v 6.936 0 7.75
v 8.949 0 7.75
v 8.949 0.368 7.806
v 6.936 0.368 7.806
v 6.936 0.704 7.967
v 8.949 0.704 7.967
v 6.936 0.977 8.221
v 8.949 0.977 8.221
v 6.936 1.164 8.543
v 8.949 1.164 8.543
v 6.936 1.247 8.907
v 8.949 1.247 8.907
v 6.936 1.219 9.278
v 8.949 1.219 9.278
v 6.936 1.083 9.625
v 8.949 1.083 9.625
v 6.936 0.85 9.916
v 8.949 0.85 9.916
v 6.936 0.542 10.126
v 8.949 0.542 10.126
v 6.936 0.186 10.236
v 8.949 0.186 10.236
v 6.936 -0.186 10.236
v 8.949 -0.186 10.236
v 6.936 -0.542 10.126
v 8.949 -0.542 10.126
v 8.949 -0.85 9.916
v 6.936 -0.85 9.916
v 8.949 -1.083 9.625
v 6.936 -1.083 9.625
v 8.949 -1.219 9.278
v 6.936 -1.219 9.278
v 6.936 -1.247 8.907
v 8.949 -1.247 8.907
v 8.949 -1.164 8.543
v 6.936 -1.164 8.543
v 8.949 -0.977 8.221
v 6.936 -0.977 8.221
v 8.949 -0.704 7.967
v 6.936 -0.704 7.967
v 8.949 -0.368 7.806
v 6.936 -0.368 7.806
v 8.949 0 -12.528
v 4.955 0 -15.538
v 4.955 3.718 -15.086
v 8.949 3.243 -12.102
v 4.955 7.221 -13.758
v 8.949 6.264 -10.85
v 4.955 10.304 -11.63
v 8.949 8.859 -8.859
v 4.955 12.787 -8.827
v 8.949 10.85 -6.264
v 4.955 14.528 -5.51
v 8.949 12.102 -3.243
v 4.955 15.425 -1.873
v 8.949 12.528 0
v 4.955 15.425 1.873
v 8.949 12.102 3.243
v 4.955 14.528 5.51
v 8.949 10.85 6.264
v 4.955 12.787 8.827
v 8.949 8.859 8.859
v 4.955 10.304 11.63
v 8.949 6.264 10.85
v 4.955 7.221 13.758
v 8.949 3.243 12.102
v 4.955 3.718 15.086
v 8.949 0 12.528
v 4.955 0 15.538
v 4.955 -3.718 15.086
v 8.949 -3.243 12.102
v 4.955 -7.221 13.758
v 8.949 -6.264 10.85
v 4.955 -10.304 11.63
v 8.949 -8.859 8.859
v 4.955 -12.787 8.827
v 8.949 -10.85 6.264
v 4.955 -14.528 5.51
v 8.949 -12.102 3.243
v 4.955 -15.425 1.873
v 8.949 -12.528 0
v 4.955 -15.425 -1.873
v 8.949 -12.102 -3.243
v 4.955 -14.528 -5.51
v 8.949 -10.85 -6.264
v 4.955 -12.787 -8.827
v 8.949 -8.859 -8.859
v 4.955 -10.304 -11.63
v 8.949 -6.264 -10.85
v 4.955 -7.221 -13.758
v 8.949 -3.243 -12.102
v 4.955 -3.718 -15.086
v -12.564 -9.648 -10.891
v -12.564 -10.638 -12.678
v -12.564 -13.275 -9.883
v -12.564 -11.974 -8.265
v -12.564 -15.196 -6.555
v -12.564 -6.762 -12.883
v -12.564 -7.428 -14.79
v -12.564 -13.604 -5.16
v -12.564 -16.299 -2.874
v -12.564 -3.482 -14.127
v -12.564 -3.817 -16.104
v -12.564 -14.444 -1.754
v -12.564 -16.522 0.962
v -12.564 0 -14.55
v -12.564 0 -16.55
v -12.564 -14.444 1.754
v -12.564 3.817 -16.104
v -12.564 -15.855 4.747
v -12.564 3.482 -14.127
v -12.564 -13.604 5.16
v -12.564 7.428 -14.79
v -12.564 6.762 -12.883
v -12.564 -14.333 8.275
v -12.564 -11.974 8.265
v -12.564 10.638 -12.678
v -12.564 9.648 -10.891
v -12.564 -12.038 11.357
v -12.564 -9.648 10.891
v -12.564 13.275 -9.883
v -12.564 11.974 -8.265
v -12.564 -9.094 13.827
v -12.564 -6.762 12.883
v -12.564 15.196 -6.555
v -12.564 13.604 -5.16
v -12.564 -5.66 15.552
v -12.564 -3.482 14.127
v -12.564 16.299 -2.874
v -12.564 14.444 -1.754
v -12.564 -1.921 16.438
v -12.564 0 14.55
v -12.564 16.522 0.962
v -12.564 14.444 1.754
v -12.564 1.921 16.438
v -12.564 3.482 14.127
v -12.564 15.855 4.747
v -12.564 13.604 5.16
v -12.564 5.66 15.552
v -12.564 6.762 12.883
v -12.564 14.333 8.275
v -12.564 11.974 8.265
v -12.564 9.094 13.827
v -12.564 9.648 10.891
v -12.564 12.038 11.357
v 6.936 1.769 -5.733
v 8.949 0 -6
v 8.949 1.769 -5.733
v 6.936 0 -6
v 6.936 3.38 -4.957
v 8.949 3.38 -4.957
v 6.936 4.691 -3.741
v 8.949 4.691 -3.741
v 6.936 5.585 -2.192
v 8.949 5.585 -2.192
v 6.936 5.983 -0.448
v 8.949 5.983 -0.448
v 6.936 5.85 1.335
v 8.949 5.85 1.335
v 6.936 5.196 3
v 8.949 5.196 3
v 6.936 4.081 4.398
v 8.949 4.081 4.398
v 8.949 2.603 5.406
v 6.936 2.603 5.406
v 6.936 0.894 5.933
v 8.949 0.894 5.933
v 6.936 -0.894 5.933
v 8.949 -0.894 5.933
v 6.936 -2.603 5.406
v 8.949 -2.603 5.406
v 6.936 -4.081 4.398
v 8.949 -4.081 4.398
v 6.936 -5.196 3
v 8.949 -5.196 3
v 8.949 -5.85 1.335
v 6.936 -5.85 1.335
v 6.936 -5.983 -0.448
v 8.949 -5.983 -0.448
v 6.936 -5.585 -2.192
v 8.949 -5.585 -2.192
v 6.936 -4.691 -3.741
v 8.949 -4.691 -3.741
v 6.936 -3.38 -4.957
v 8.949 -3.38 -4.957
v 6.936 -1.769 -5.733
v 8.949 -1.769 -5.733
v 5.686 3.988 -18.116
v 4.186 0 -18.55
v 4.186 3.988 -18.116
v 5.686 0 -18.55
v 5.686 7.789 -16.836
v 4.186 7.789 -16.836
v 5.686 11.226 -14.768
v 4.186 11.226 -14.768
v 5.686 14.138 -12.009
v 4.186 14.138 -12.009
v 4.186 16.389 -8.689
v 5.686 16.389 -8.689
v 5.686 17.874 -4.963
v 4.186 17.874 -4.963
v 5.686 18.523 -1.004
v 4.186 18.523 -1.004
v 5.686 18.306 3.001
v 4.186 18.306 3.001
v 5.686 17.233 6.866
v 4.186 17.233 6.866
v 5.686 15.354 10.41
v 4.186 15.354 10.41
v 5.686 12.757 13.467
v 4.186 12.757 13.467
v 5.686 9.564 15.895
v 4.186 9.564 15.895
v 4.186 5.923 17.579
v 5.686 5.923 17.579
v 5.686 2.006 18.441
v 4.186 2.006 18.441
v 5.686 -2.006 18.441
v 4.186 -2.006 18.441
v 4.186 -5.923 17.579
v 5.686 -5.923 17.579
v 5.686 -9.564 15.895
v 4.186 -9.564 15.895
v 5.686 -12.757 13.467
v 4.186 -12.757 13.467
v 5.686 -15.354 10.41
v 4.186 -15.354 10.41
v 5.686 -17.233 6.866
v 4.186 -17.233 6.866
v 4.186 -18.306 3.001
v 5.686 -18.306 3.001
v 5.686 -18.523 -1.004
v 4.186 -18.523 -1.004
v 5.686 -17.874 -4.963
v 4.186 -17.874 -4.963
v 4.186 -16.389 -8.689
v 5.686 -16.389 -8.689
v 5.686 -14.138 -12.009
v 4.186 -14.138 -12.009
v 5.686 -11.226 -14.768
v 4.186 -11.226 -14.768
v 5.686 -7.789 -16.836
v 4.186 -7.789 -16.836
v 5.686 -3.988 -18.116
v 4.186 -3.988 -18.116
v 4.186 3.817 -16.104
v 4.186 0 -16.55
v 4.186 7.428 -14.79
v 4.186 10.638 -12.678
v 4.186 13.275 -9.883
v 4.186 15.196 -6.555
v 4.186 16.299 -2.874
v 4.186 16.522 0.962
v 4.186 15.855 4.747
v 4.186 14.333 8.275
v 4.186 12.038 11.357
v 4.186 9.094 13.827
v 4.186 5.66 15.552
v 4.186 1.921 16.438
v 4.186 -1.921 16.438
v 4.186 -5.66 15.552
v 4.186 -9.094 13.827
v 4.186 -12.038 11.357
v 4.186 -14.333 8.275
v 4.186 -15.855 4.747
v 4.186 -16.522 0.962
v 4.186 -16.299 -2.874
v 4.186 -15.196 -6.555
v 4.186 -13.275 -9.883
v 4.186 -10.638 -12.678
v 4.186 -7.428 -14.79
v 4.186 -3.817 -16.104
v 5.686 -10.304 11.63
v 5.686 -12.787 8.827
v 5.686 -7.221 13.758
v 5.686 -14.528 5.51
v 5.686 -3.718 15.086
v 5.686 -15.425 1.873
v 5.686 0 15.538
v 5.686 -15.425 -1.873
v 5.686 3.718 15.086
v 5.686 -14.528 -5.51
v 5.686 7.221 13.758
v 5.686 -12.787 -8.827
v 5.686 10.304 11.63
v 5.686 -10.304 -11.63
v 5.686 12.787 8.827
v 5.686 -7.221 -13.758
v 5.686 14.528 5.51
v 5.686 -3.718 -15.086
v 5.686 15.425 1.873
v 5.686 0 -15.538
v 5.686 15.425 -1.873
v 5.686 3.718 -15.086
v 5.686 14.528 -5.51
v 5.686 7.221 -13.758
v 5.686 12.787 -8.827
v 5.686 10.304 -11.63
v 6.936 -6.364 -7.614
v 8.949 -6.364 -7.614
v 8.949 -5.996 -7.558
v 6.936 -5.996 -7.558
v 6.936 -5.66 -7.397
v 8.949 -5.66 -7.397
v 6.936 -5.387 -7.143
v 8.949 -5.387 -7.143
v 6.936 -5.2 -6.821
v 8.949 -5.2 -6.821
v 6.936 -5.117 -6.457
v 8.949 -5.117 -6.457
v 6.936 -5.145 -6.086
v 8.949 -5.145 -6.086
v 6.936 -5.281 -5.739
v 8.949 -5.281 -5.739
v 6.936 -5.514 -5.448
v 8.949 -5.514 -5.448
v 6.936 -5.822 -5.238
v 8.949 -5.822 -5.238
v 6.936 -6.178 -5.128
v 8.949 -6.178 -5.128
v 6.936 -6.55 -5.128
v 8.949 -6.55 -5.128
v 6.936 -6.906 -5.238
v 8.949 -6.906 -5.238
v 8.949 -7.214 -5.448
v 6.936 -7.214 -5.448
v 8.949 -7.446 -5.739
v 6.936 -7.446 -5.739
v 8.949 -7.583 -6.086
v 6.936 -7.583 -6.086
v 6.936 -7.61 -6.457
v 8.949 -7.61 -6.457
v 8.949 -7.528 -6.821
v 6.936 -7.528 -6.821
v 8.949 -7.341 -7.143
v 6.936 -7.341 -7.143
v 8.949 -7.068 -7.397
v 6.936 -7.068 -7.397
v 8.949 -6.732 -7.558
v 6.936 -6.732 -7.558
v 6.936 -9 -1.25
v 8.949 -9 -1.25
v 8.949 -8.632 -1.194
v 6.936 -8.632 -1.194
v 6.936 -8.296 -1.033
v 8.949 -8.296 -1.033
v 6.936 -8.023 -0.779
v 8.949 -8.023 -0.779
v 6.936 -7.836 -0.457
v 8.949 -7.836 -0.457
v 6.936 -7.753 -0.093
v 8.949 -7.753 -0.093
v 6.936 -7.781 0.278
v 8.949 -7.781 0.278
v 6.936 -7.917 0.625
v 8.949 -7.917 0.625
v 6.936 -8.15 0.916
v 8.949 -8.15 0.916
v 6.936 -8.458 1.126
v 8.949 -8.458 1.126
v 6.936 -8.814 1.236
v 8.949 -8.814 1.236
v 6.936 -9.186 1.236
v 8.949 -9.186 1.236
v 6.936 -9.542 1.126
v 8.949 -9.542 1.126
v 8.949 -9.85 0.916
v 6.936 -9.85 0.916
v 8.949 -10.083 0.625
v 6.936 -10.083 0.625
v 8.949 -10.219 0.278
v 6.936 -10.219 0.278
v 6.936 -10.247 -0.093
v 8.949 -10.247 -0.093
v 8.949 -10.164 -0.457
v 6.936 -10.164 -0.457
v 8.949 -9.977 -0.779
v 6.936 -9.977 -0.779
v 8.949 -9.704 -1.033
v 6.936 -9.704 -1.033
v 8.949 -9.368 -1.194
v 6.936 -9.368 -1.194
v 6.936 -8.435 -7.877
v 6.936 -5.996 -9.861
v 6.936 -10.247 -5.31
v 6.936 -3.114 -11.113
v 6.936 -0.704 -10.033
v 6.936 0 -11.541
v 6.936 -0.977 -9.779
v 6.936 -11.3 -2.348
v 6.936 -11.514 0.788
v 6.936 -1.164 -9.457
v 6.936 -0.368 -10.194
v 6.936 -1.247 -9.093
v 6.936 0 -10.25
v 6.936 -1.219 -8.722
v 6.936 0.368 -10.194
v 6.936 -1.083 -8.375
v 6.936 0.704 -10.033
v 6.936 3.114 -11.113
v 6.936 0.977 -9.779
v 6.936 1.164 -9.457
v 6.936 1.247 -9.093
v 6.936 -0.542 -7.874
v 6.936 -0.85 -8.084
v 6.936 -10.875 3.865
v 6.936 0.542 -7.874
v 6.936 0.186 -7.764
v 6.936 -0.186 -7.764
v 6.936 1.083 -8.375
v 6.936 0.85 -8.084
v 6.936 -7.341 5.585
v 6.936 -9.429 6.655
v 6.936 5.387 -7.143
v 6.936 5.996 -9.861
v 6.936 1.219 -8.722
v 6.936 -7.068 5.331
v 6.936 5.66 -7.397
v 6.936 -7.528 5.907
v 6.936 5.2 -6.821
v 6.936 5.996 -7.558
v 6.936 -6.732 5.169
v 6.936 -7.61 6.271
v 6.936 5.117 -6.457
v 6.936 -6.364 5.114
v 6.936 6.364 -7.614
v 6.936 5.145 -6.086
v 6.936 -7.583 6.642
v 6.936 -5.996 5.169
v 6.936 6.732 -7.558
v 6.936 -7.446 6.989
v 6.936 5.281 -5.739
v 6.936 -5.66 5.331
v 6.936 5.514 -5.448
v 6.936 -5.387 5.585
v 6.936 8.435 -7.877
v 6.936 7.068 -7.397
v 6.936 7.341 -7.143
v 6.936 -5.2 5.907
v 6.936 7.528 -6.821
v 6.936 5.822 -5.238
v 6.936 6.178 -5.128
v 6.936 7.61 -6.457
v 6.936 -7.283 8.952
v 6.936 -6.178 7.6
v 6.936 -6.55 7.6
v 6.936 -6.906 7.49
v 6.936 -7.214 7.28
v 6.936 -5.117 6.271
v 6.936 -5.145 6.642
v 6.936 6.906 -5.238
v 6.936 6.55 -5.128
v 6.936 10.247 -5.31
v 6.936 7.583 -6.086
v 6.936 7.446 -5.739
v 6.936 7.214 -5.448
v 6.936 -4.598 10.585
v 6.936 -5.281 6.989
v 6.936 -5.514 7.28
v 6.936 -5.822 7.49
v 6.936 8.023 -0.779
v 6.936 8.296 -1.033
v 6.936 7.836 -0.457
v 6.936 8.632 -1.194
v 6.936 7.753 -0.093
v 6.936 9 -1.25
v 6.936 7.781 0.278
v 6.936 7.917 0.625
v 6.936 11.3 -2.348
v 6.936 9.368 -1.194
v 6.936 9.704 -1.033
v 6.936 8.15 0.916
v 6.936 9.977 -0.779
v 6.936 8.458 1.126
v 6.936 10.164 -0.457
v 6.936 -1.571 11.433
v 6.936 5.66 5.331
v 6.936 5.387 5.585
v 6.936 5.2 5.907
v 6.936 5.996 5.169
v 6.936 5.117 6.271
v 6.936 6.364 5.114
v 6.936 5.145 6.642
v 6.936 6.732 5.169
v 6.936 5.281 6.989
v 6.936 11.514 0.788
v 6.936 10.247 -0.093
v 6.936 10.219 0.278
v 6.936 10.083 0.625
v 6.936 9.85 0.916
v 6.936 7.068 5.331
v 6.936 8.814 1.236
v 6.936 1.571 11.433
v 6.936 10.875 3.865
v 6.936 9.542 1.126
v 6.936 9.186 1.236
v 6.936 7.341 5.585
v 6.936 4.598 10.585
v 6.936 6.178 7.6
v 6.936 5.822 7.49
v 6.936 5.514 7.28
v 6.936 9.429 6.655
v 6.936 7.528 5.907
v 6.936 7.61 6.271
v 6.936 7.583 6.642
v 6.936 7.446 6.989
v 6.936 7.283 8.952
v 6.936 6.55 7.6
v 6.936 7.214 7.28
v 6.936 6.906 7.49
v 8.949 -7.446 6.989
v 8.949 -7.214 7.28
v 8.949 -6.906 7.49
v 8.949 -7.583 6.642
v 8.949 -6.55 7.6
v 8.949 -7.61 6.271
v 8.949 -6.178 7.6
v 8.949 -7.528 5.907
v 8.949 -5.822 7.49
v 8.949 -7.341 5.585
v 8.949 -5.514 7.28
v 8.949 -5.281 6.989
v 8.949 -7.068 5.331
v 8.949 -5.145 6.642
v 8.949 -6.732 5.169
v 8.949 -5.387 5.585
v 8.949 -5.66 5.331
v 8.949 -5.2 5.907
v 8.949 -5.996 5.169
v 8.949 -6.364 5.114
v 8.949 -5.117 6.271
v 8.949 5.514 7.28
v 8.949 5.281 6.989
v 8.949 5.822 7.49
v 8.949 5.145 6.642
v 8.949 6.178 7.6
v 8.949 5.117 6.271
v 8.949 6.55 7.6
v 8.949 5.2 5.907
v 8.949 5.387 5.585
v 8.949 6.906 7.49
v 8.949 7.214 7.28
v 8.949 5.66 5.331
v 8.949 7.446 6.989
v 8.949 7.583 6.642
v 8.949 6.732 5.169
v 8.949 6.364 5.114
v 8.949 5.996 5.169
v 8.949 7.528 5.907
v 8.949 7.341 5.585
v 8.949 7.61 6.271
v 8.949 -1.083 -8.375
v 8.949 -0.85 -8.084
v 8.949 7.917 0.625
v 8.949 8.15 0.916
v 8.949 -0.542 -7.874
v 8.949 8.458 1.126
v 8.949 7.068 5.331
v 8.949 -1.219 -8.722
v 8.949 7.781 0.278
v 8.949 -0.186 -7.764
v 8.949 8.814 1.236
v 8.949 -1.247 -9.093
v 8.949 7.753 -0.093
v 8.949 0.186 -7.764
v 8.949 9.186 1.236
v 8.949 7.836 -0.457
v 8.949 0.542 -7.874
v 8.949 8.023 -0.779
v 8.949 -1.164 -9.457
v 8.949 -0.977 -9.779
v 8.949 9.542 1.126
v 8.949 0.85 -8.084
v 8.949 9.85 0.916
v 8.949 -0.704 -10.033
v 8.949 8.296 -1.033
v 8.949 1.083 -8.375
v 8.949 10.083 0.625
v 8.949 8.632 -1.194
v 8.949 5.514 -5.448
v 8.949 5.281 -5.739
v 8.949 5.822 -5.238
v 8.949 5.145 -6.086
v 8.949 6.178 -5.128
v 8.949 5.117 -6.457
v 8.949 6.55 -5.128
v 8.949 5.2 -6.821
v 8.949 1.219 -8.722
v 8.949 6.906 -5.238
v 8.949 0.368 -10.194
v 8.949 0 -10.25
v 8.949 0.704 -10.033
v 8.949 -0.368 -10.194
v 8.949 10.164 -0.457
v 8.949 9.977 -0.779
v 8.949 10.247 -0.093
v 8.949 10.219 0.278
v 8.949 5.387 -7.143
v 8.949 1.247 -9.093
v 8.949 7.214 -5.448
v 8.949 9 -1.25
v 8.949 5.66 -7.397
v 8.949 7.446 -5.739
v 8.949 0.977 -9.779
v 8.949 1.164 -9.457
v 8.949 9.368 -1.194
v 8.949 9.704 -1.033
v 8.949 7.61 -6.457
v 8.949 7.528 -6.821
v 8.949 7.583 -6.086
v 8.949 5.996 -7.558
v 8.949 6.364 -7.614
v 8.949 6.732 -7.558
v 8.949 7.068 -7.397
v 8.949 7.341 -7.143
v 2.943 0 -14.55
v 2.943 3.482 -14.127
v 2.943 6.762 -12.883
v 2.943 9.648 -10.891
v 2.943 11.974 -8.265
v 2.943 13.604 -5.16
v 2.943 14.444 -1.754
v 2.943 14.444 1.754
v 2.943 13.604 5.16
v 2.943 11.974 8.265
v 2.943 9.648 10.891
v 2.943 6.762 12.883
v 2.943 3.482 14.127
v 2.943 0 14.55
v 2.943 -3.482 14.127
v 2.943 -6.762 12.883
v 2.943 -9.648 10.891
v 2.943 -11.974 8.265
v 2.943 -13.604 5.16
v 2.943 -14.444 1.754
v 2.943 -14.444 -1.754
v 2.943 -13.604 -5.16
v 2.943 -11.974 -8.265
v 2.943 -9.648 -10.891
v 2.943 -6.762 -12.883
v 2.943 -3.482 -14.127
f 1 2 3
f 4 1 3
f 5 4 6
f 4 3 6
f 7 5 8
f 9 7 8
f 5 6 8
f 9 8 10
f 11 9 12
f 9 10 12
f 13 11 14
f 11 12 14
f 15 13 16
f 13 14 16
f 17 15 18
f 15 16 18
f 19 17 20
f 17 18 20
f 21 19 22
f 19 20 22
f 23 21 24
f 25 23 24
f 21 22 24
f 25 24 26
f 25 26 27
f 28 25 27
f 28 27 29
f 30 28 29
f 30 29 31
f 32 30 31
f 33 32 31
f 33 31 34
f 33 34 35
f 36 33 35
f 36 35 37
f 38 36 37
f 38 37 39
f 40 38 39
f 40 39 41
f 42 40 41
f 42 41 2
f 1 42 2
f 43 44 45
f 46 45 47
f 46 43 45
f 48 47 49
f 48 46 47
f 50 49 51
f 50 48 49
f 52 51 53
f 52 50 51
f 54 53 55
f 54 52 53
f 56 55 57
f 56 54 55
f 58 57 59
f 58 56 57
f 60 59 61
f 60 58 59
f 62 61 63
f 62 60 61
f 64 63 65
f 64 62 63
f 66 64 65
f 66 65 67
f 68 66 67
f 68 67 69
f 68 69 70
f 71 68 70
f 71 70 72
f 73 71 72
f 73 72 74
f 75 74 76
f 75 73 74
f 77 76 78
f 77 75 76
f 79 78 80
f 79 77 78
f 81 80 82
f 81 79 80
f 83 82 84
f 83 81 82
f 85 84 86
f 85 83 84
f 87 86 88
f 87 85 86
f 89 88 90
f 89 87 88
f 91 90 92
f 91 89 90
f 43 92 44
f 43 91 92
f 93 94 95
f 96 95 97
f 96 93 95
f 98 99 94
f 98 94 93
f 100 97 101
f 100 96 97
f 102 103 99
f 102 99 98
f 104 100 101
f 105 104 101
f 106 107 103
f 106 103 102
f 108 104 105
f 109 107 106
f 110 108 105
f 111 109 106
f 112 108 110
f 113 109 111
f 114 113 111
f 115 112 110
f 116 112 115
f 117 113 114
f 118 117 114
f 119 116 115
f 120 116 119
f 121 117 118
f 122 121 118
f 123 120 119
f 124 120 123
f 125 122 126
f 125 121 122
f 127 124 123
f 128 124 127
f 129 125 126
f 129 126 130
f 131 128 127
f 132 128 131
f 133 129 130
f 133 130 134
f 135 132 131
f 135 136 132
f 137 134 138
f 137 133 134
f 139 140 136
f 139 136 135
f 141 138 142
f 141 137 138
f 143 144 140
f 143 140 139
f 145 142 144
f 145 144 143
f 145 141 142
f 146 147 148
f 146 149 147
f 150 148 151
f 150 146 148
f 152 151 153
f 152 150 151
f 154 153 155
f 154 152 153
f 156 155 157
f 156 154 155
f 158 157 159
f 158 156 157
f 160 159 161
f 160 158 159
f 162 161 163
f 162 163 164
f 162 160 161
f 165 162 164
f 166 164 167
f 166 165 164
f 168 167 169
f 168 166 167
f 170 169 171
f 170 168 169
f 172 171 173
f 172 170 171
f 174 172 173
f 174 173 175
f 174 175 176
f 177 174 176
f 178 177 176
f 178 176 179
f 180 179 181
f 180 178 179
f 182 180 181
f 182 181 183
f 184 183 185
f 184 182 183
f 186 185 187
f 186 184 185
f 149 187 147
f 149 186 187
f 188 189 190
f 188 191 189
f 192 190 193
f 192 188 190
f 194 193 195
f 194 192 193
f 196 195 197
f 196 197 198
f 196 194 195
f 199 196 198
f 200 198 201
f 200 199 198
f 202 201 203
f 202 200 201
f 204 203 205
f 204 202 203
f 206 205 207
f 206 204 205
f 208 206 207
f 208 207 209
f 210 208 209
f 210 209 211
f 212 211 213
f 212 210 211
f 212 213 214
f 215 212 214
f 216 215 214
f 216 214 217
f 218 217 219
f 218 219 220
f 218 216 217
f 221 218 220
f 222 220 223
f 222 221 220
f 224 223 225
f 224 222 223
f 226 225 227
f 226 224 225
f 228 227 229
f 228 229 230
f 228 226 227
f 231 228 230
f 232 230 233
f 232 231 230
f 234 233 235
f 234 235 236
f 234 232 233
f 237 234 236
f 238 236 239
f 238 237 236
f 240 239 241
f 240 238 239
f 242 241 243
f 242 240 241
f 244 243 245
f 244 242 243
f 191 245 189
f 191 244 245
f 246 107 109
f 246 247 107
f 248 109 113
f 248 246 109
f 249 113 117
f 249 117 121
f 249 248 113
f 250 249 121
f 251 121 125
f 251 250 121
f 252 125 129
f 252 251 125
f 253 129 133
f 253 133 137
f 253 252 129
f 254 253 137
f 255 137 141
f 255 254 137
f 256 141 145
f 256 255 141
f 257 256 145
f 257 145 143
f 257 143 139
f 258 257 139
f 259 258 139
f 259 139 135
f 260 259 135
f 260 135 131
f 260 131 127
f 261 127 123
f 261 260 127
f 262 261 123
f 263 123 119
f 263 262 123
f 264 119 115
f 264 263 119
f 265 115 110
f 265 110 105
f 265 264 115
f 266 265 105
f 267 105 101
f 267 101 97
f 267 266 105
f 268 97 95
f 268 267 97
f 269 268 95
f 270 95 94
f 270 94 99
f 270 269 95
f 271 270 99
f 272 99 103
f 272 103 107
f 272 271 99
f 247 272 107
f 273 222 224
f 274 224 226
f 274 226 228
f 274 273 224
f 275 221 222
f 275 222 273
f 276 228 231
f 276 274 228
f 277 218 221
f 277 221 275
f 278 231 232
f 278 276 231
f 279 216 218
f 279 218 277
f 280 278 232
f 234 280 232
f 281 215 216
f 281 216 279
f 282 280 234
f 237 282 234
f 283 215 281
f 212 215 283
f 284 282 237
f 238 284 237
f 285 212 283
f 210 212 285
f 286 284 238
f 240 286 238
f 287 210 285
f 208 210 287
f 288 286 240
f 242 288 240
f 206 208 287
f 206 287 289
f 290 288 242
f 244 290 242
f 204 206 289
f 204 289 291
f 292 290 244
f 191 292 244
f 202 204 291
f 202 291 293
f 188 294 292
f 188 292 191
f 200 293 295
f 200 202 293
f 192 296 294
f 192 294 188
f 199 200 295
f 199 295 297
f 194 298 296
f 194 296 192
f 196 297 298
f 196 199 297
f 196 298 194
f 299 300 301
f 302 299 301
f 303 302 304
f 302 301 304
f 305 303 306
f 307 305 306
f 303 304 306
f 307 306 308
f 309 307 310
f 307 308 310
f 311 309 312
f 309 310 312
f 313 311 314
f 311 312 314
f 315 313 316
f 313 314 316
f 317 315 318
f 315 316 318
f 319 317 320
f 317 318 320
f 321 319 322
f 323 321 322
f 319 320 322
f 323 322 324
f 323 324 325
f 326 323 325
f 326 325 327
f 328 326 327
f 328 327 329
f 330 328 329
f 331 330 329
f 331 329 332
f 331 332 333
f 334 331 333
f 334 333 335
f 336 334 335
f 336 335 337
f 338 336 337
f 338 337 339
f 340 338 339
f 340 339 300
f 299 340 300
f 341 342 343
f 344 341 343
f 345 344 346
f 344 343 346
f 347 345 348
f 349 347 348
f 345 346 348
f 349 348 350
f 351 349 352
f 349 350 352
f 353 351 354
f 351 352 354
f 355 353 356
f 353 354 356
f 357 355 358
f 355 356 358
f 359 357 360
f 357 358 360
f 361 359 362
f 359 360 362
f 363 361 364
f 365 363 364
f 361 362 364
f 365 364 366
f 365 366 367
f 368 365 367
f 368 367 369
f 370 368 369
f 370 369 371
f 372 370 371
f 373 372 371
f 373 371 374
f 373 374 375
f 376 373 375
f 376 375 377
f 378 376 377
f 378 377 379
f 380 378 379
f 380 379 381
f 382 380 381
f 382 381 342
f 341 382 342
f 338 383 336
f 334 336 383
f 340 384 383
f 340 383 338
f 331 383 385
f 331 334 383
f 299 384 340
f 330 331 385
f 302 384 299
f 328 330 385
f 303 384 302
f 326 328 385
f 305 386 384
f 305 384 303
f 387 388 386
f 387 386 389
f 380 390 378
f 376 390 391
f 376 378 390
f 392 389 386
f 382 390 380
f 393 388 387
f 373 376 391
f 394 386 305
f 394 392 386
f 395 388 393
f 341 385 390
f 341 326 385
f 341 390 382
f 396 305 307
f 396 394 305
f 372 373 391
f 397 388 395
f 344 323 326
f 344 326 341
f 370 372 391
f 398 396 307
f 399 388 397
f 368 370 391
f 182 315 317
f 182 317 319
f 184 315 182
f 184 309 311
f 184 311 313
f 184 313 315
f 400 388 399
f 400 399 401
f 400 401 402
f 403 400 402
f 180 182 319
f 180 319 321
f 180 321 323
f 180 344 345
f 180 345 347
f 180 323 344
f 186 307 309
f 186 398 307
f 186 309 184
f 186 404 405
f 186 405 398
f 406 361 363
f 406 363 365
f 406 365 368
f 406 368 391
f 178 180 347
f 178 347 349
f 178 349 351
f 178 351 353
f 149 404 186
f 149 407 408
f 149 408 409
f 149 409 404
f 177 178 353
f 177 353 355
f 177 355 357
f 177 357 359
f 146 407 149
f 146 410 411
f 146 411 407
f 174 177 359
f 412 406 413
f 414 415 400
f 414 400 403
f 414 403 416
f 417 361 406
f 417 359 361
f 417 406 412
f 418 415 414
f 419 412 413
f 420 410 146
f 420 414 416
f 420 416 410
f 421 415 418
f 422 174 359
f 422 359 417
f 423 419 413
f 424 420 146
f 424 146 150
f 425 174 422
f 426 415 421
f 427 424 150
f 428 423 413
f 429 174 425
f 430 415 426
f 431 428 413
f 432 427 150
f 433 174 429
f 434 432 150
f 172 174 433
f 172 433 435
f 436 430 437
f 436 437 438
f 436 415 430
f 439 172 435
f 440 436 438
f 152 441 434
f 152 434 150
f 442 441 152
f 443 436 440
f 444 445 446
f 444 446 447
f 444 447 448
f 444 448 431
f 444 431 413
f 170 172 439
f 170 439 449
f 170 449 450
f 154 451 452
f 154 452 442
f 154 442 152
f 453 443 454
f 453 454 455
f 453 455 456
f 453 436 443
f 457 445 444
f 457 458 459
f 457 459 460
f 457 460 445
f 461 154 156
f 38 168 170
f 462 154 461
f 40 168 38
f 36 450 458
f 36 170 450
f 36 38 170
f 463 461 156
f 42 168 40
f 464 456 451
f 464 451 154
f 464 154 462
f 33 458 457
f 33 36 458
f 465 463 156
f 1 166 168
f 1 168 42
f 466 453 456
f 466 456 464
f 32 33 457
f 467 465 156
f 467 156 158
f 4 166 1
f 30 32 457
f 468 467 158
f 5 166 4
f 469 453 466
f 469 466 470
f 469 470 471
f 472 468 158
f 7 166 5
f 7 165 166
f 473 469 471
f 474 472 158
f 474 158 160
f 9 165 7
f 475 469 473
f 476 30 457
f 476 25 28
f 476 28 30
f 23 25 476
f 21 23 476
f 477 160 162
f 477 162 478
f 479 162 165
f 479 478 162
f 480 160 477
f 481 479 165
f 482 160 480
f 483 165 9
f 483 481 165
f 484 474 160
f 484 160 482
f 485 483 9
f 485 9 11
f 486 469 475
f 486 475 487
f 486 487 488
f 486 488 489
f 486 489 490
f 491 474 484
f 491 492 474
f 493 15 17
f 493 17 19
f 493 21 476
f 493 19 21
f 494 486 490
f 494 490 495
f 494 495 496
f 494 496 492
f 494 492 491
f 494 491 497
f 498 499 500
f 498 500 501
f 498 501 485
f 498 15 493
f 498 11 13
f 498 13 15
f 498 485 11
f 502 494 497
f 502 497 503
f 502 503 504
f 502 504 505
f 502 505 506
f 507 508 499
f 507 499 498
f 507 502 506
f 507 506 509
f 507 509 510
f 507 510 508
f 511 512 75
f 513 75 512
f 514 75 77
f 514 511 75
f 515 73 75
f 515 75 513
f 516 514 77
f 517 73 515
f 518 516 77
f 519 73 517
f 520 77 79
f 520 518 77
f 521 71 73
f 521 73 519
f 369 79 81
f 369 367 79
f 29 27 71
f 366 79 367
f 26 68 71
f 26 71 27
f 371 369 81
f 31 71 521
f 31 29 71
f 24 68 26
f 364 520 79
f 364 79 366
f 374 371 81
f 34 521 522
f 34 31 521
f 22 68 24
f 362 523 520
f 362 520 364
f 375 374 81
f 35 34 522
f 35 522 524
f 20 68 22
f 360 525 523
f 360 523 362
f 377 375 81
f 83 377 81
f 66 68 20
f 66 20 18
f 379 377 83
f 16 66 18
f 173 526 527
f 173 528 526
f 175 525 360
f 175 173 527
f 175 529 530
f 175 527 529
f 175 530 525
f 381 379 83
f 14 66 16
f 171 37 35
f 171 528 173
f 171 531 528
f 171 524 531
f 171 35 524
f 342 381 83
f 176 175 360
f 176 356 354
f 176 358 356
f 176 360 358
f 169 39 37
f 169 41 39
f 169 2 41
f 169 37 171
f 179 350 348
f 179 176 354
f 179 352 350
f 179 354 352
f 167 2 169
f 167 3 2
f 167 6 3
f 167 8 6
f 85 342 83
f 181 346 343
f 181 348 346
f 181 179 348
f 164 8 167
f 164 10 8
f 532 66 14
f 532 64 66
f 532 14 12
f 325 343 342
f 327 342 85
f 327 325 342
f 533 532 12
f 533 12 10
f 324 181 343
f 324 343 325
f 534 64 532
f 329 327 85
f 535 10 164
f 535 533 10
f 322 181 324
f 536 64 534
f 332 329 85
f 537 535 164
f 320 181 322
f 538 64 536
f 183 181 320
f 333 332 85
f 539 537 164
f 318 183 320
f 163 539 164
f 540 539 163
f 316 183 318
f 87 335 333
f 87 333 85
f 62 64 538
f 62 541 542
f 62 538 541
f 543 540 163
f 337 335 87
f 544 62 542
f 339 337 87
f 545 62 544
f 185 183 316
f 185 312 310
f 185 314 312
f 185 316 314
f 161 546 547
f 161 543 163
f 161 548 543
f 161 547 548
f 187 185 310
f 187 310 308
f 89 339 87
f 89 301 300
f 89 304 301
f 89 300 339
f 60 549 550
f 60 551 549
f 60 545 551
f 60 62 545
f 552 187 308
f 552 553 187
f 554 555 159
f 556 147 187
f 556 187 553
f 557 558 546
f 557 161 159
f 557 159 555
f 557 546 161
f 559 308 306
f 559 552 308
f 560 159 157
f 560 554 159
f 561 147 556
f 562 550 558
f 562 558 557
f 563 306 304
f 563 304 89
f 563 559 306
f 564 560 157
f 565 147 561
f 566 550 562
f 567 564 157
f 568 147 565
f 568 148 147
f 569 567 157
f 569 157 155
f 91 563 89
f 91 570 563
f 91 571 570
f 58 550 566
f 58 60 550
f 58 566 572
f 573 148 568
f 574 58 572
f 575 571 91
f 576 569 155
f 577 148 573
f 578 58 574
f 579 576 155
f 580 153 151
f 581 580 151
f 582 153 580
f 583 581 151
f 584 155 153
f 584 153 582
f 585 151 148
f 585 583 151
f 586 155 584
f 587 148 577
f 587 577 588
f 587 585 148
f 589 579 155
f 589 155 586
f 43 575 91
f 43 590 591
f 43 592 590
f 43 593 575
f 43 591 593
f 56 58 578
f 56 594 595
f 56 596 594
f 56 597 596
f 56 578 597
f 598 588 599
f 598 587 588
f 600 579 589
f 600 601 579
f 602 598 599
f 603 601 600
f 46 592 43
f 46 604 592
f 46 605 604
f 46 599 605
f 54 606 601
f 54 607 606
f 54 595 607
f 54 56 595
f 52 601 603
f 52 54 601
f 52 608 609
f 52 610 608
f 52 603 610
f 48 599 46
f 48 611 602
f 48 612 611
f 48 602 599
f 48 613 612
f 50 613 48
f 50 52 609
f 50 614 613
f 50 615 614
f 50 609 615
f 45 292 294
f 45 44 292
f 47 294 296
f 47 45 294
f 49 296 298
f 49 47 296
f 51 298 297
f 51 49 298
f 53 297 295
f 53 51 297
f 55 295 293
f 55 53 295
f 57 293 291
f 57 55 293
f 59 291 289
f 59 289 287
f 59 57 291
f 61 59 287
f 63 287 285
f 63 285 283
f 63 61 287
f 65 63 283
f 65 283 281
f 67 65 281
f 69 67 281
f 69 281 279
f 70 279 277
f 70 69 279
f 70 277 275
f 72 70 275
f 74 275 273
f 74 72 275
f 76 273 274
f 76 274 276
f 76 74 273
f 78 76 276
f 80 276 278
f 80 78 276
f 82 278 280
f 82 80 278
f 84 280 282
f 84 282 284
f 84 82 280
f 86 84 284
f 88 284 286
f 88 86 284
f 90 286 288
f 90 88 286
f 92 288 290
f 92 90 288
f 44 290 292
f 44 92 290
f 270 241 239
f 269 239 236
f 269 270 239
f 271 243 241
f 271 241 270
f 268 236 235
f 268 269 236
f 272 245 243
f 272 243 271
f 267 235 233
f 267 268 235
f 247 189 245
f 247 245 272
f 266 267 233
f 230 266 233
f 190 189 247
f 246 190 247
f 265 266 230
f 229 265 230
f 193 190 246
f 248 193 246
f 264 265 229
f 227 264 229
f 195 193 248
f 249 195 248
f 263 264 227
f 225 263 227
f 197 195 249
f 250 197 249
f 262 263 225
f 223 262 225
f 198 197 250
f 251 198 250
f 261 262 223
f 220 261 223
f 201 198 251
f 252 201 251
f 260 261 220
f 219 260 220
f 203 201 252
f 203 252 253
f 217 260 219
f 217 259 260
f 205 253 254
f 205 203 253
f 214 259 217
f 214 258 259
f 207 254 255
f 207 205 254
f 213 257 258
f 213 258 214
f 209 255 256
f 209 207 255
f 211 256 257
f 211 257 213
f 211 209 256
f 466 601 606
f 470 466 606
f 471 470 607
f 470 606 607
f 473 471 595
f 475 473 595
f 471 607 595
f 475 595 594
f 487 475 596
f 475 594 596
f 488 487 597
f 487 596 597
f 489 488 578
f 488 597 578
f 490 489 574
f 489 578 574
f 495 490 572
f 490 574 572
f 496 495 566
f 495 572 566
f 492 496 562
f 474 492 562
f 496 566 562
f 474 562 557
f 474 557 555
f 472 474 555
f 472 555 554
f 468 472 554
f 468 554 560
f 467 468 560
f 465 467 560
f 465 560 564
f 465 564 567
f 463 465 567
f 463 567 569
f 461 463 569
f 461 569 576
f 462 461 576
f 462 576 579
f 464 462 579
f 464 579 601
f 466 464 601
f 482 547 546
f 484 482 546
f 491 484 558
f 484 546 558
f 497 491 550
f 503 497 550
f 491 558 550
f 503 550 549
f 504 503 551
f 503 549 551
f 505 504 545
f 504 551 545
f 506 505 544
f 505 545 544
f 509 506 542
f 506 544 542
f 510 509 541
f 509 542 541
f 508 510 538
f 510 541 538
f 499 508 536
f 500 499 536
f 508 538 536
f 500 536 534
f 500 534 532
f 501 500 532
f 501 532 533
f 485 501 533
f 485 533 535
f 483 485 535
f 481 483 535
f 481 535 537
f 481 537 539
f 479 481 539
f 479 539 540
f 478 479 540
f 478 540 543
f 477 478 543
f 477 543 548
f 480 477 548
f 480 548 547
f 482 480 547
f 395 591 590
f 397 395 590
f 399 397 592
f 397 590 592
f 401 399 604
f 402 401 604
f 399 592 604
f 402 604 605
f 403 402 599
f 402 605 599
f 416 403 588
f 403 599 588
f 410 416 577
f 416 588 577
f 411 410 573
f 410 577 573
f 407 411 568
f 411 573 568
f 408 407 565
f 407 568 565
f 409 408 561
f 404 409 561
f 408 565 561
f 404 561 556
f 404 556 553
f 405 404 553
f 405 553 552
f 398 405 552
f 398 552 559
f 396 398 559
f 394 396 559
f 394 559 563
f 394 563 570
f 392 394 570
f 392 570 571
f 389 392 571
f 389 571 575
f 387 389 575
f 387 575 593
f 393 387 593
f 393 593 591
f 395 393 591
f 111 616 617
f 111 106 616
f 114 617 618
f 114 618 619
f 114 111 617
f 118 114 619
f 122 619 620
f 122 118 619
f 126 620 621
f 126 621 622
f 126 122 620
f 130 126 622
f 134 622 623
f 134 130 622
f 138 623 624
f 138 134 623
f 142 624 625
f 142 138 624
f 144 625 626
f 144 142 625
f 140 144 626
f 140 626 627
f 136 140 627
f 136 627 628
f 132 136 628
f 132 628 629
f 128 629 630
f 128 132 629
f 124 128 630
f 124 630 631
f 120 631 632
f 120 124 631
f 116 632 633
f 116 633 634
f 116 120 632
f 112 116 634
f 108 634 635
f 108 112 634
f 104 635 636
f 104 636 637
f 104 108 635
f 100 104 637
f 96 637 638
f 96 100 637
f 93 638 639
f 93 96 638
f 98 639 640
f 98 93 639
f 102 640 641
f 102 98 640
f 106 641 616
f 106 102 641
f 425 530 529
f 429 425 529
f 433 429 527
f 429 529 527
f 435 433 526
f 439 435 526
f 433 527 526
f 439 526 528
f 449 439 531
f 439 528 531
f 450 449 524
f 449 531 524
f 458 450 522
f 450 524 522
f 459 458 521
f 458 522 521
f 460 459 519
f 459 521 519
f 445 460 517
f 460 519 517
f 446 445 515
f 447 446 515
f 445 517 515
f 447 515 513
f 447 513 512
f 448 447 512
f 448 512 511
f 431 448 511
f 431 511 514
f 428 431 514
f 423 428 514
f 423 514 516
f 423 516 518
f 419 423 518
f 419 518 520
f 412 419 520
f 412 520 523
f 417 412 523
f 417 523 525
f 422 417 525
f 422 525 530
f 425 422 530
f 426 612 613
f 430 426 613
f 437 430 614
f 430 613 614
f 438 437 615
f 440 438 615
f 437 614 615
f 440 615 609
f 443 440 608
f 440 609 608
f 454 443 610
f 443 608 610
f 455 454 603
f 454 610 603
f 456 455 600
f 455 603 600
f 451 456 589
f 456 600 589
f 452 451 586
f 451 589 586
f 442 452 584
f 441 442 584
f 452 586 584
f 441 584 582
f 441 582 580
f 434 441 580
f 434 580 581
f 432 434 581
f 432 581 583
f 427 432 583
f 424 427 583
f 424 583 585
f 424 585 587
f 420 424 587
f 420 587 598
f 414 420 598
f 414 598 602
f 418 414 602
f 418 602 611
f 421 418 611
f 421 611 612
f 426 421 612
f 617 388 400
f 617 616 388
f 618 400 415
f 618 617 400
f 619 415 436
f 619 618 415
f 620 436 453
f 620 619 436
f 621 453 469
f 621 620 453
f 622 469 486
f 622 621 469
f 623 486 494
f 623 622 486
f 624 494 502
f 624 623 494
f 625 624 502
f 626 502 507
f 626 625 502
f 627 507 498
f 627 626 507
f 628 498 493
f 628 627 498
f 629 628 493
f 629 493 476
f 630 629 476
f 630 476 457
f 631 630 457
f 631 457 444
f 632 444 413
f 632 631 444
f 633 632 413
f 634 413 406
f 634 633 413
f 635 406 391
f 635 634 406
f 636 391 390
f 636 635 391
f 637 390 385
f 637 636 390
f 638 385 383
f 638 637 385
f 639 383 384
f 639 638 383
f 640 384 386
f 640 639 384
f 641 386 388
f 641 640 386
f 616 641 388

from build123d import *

# Parameters (mm, degrees)
SKETCH2_R          = 1.25
CUT_EXTRUDE1_DEPTH = 22.512750464


with BuildPart() as part:
    # Sketch1 → Revolve1 (revolve)
    with BuildSketch(Plane(origin=(0, 0, 0), x_dir=(1, 0, 0), z_dir=(0, 1, 0))):
        Polygon((-12.563694364, 14.55), (-12.563694364, 16.55), (4.186305636, 16.55), (4.186305636, 18.55), (5.686305636, 18.55), (5.686305636, 15.537968137), (4.955330367, 15.537968137), (8.9490561, 12.528479936), (8.9490561, 6), (6.936305636, 6), (6.936305636, 11.540924884), (2.943128086, 14.55), align=None)
    revolve(axis=Axis((-37.278866169, 0, 0), (1, 0, 0)))

    # Sketch2 → Cut-Extrude1 (cut, through all)
    with BuildSketch(Plane(origin=(8.9490561, 0, 0), x_dir=(0, 0, -1), z_dir=(1, 0, 0))):
        with Locations((0, 9)):
            Circle(SKETCH2_R)
        with Locations((6.363961031, 6.363961031)):
            Circle(SKETCH2_R)
        with Locations((9, 0)):
            Circle(SKETCH2_R)
        with Locations((6.363961031, -6.363961031)):
            Circle(SKETCH2_R)
        with Locations((0, -9)):
            Circle(SKETCH2_R)
        with Locations((-6.363961031, -6.363961031)):
            Circle(SKETCH2_R)
        with Locations((-9, 0)):
            Circle(SKETCH2_R)
        with Locations((-6.363961031, 6.363961031)):
            Circle(SKETCH2_R)
    extrude(amount=-CUT_EXTRUDE1_DEPTH, mode=Mode.SUBTRACT)


solid = part.part
